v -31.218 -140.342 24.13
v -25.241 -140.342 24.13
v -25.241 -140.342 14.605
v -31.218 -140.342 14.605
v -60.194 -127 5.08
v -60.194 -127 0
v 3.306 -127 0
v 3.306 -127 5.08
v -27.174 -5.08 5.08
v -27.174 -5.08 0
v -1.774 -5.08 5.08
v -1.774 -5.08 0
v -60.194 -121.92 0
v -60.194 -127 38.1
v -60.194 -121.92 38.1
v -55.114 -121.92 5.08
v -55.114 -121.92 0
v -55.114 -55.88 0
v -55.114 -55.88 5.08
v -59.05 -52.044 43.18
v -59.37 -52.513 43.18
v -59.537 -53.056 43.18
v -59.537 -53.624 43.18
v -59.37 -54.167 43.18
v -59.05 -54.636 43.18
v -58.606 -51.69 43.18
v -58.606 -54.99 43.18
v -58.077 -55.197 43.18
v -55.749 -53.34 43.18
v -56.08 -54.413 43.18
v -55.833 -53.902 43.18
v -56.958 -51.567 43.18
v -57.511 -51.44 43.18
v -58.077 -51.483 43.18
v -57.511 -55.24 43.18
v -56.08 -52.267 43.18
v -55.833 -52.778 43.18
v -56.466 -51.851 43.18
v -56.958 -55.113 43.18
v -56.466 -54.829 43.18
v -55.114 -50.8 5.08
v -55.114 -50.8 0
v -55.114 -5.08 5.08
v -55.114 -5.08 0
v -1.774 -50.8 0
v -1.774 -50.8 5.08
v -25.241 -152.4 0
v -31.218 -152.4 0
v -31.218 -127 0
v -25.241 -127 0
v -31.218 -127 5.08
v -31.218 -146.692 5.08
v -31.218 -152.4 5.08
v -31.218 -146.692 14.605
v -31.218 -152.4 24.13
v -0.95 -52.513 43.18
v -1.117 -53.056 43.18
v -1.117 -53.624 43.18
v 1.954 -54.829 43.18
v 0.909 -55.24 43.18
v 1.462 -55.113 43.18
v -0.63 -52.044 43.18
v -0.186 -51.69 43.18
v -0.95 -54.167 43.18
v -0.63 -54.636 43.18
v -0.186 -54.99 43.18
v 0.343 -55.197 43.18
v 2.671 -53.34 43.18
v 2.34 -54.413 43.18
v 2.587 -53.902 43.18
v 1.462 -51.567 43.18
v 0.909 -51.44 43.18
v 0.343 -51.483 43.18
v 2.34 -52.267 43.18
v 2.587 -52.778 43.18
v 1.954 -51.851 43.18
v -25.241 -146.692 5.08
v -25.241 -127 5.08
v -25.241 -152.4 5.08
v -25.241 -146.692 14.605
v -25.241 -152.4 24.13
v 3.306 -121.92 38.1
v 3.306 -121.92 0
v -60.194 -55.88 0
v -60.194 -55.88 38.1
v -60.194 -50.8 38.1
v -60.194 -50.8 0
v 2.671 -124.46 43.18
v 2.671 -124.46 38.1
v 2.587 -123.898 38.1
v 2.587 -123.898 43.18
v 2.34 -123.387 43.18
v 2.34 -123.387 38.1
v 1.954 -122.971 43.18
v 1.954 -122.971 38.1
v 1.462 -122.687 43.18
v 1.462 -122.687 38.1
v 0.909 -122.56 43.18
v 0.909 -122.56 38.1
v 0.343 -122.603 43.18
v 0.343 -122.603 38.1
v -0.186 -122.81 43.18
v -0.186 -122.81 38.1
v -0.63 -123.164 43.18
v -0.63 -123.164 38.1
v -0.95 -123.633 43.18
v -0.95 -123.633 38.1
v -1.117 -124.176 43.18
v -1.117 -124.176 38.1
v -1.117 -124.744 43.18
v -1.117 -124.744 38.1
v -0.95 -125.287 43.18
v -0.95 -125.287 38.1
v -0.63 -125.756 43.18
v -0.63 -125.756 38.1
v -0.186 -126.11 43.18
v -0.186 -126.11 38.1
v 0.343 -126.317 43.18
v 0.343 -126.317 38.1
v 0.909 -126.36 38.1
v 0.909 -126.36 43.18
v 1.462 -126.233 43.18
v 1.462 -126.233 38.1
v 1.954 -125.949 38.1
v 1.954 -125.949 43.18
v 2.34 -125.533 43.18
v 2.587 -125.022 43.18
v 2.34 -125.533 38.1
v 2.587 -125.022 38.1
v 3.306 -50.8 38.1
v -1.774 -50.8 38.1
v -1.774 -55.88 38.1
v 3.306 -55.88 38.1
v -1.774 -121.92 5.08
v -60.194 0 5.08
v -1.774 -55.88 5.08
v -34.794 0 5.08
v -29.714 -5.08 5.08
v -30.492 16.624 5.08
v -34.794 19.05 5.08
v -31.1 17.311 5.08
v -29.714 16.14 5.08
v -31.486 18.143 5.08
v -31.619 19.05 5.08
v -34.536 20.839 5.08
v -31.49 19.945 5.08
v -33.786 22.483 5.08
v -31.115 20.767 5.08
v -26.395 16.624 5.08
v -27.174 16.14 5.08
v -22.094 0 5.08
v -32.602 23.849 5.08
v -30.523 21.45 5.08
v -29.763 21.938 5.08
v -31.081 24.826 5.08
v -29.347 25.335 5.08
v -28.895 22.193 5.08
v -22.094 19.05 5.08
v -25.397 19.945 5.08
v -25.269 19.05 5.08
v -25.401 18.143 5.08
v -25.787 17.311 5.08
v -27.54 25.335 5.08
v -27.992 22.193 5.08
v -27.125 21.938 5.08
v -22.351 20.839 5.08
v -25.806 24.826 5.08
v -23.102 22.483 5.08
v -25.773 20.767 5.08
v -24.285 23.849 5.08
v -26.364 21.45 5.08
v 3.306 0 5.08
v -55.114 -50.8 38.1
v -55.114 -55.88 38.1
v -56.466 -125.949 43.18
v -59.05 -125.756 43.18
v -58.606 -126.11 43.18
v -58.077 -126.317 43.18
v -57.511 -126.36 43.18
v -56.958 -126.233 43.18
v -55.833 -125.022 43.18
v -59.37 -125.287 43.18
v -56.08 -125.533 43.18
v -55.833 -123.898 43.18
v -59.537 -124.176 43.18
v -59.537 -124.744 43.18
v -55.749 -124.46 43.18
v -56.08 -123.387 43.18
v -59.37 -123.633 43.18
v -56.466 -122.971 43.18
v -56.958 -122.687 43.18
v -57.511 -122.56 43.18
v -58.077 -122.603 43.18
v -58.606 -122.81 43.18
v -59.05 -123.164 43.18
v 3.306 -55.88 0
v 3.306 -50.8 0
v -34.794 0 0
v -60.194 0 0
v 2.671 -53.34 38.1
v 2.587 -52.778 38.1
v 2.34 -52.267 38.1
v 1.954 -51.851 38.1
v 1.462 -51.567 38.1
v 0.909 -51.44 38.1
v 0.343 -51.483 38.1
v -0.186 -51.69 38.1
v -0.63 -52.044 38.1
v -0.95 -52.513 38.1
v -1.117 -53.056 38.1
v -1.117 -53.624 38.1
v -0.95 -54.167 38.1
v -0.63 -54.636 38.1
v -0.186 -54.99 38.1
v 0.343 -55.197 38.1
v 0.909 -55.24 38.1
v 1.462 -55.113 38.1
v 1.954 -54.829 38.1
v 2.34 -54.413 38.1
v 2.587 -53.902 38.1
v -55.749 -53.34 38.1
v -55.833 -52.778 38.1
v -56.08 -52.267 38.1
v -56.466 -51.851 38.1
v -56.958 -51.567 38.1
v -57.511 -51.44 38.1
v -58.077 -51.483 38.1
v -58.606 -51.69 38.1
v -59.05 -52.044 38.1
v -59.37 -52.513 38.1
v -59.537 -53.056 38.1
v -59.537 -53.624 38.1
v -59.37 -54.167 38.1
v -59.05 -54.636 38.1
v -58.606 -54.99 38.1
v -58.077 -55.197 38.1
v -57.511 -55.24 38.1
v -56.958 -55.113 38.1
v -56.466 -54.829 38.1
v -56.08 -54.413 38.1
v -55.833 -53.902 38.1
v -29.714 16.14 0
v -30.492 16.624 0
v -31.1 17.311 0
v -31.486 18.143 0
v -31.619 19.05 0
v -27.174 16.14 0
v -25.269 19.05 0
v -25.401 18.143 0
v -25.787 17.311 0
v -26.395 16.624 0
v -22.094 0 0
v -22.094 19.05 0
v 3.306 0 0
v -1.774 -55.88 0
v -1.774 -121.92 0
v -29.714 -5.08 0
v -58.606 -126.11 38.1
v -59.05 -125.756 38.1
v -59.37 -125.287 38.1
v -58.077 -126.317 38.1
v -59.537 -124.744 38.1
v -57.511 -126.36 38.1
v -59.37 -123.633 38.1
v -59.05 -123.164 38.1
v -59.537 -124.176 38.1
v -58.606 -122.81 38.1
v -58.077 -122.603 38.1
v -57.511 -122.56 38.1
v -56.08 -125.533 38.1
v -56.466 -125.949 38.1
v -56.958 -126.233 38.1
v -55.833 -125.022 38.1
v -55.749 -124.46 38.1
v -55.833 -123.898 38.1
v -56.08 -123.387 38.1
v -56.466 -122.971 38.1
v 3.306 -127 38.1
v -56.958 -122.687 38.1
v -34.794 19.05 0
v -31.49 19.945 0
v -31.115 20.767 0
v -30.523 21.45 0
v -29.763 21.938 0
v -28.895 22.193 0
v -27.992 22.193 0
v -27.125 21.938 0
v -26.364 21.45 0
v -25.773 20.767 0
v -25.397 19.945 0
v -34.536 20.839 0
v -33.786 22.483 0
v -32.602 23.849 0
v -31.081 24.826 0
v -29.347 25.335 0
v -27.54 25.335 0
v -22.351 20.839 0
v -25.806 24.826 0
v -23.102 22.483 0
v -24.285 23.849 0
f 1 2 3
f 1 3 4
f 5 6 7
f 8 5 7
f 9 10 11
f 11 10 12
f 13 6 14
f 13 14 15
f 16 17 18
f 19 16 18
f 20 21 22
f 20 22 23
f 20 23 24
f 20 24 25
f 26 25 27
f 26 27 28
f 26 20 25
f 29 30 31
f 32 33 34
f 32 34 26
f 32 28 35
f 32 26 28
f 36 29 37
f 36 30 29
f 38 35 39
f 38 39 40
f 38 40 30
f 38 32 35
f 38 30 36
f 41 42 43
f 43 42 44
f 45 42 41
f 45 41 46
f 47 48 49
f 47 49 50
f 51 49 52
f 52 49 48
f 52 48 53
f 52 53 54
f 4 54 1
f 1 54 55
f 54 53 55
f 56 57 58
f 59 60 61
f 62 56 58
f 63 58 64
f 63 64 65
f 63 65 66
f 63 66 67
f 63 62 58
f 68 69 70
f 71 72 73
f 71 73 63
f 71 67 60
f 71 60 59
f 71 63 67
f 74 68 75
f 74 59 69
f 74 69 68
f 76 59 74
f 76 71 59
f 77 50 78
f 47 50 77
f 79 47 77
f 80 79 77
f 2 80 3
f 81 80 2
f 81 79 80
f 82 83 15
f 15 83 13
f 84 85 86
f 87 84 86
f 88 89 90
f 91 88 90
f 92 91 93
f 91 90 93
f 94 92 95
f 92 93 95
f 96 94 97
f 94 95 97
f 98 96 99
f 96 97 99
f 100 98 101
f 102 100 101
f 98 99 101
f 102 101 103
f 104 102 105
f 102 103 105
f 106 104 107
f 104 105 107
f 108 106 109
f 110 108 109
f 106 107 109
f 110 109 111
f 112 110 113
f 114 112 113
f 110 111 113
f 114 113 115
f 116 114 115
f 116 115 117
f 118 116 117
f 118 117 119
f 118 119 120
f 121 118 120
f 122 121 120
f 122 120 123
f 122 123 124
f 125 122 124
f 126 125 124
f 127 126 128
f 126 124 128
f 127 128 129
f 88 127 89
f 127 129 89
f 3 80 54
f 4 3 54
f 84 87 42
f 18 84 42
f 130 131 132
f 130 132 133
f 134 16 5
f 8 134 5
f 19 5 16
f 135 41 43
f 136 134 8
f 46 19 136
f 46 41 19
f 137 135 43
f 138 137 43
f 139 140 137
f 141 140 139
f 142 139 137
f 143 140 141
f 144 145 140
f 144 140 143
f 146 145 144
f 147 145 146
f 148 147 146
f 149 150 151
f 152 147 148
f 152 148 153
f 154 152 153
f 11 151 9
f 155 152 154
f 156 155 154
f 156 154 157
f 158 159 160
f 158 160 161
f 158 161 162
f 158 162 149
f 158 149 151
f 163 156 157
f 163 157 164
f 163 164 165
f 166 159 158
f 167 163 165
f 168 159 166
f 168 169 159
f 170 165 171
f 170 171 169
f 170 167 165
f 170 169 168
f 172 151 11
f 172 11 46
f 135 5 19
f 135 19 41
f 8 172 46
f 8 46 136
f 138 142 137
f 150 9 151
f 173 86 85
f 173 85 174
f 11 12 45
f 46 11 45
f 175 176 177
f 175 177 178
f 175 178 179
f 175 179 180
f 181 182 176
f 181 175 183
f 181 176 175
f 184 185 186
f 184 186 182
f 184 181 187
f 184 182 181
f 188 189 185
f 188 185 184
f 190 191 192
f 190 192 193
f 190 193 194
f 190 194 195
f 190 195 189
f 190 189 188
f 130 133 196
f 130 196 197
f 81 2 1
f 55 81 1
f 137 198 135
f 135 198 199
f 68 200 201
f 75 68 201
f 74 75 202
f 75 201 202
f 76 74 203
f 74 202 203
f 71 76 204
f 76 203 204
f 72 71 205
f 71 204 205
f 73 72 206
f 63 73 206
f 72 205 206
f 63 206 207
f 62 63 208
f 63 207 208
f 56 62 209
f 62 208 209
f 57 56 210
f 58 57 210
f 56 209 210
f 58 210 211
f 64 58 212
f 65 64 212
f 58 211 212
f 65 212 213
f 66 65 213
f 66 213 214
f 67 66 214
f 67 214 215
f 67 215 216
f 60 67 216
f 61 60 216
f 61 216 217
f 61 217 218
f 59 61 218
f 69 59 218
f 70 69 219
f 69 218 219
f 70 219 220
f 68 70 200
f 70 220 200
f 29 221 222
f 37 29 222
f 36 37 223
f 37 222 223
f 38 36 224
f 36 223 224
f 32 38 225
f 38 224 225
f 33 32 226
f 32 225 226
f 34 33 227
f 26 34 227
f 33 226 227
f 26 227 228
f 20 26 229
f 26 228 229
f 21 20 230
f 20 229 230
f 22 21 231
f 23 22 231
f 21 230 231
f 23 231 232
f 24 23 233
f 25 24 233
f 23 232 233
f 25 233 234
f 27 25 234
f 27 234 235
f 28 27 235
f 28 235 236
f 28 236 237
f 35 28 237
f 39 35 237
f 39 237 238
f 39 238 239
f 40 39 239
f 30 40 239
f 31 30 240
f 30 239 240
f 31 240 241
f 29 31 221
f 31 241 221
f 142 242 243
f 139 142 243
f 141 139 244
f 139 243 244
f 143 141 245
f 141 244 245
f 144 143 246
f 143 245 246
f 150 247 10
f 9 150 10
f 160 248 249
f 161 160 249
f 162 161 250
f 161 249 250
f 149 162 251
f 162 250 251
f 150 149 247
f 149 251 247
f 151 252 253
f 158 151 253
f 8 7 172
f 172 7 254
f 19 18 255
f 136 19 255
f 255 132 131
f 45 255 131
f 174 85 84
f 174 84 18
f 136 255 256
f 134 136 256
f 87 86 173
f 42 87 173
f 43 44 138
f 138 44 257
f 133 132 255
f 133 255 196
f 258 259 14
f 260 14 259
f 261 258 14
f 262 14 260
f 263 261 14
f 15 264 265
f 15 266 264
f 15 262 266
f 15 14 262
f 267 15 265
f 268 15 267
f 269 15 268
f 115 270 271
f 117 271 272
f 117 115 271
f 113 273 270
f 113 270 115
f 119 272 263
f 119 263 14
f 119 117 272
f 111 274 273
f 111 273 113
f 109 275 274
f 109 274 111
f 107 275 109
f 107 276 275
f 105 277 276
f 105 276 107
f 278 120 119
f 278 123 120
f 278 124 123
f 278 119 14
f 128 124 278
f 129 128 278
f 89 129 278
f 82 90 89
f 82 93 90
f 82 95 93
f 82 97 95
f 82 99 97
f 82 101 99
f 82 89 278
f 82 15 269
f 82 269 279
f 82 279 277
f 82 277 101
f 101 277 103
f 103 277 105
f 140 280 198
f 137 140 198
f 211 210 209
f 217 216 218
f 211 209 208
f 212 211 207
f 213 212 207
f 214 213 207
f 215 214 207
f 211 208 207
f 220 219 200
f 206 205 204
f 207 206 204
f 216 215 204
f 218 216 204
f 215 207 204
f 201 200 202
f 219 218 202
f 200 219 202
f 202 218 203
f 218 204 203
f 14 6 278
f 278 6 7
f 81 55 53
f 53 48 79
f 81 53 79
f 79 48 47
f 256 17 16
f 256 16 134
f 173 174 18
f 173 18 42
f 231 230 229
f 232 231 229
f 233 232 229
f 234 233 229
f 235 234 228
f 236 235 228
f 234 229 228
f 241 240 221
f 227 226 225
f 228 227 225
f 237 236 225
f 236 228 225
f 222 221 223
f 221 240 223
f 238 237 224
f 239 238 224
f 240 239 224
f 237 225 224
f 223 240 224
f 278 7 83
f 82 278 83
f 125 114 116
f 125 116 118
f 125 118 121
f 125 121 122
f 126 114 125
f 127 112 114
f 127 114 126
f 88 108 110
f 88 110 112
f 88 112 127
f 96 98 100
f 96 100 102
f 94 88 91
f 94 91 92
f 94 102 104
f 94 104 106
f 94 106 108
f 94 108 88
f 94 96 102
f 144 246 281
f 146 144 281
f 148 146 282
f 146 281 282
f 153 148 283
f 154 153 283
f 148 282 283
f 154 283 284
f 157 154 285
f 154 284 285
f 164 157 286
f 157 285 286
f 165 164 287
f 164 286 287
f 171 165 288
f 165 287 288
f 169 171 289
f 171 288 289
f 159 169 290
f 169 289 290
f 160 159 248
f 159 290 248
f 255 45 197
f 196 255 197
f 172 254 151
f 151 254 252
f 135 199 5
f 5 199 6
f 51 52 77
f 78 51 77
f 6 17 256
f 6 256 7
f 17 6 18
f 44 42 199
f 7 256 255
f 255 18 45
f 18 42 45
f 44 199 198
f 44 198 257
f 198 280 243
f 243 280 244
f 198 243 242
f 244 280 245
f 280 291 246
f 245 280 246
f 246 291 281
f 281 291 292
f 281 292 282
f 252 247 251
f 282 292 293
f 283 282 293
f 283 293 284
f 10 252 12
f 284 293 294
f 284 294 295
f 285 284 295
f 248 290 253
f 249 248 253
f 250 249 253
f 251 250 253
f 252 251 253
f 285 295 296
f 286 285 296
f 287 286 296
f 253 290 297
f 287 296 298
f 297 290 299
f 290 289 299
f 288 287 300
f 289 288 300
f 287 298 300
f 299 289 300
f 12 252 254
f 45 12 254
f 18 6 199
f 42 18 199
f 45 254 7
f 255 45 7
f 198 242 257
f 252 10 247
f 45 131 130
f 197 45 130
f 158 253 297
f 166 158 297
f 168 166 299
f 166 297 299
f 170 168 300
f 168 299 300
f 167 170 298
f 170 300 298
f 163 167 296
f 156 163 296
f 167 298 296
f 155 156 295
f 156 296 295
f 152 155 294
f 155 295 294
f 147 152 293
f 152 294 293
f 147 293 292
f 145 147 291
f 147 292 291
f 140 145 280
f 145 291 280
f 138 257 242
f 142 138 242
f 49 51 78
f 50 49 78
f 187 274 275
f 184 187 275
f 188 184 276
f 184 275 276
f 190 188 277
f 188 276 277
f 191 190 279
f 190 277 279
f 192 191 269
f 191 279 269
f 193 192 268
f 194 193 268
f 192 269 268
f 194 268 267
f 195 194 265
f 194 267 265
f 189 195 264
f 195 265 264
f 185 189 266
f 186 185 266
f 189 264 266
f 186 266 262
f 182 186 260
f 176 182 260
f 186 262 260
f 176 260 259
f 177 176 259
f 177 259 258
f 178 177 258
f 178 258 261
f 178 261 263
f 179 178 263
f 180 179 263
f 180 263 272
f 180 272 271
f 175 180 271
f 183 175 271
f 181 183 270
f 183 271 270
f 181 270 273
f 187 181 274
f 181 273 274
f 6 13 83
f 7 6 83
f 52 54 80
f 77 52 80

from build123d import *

# Parameters (mm, degrees)
F0_W      = 5.08
F0_H      = 5.08
F1_DEPTH  = 38.1
F0_W_2    = 53.34
F0_H_2    = 45.72
F0_H_3    = 66.04
F2_DEPTH  = 5.08
F5_R      = 1.905
F6_DEPTH  = 5.08
F4_R      = 1.905
F3_R      = 1.905
F7_W      = 5.9777759016
F7_H      = 5.08
F8_DEPTH  = 25.4
F9_W      = 5.9777759016
F9_H      = 5.7076345921
F10_DEPTH = 19.05
F11_W     = 5.9777759016
F11_H     = 9.525
F12_DEPTH = 6.35


with BuildPart() as f1:
    # F0 (on Top) → F1 (new body)
    with BuildSketch(Plane.XY):
        with Locations((-57.6535785222, -53.34)):
            Rectangle(F0_W, F0_H)
    extrude(amount=F1_DEPTH)


with BuildPart() as f1b:
    # F0 (on Top) → F1, piece 2 (new body)
    with BuildSketch(Plane.XY):
        with Locations((0.7664214778, -53.34)):
            Rectangle(F0_W, F0_H)
    extrude(amount=F1_DEPTH)


with BuildPart() as f1c:
    # F0 (on Top) → F1, piece 3 (new body)
    with BuildSketch(Plane.XY):
        with Locations((0.7664214778, -124.46)):
            Rectangle(F0_W, F0_H)
        with Locations((-57.6535785222, -124.46)):
            Rectangle(F0_W, F0_H)
        with Locations((-28.4435785222, -124.46)):
            Rectangle(F0_W_2, F0_H)
    extrude(amount=F1_DEPTH)

    # F5 (on face) → F6 (join)
    with BuildSketch(Plane.XY.offset(38.1)):
        with Locations((-57.6535785222, -124.46)):
            Circle(F5_R)
        with Locations((0.7664214778, -124.46)):
            Circle(F5_R)
    extrude(amount=F6_DEPTH)


with BuildPart() as f2:
    # F0 (on Top) → F2 (new body)
    with BuildSketch(Plane.XY):
        with BuildLine():
            Line((-22.0935785222, 19.05), (-25.2685785222, 19.05))
            ThreePointArc((-25.2685785222, 19.05), (-25.787182938, 17.3109808799), (-27.1735785222, 16.1400644337))
            Line((-27.1735785222, 16.1400644337), (-27.1735785222, 12.8282960533))
            ThreePointArc((-27.1735785222, 12.8282960533), (-23.5248896725, 15.0339073716), (-22.0935785222, 19.05))
        make_face()
        with BuildLine():
            ThreePointArc((-31.6185785222, 19.05), (-28.4435785222, 22.225), (-25.2685785222, 19.05))
            Line((-25.2685785222, 19.05), (-22.0935785222, 19.05))
            ThreePointArc((-22.0935785222, 19.05), (-28.4435785222, 25.4), (-34.7935785222, 19.05))
            Line((-34.7935785222, 19.05), (-31.6185785222, 19.05))
        make_face()
        with BuildLine():
            ThreePointArc((-29.7135785222, 16.1400644337), (-31.0999741065, 17.3109808799), (-31.6185785222, 19.05))
            Line((-31.6185785222, 19.05), (-34.7935785222, 19.05))
            ThreePointArc((-34.7935785222, 19.05), (-33.3622673719, 15.0339073716), (-29.7135785222, 12.8282960533))
            Line((-29.7135785222, 12.8282960533), (-29.7135785222, 16.1400644337))
        make_face()
        with BuildLine():
            Line((-22.0935785222, 0), (-22.0935785222, 19.05))
            ThreePointArc((-22.0935785222, 19.05), (-23.5248896725, 15.0339073716), (-27.1735785222, 12.8282960533))
            Line((-27.1735785222, 12.8282960533), (-27.1735785222, 0))
            Line((-27.1735785222, 0), (-22.0935785222, 0))
        make_face()
        with BuildLine():
            ThreePointArc((-29.7135785222, 12.8282960533), (-33.3622673719, 15.0339073716), (-34.7935785222, 19.05))
            Line((-34.7935785222, 19.05), (-34.7935785222, 0))
            Line((-34.7935785222, 0), (-29.7135785222, 0))
            Line((-29.7135785222, 0), (-29.7135785222, 12.8282960533))
        make_face()
        Polygon((-1.7735785222, 0), (-22.0935785222, 0), (-27.1735785222, 0), (-27.1735785222, -5.08), (-1.7735785222, -5.08), align=None)
        Polygon((-29.7135785222, 0), (-34.7935785222, 0), (-55.1135785222, 0), (-55.1135785222, -5.08), (-29.7135785222, -5.08), align=None)
        with Locations((0.7664214778, -2.54)):
            Rectangle(F0_W, F0_H)
        with Locations((-57.6535785222, -2.54)):
            Rectangle(F0_W, F0_H)
        with Locations((0.7664214778, -27.94)):
            Rectangle(F0_W, F0_H_2)
        with Locations((-57.6535785222, -27.94)):
            Rectangle(F0_W, F0_H_2)
        with Locations((0.7664214778, -53.34)):
            Rectangle(F0_W, F0_H)
        with Locations((-57.6535785222, -53.34)):
            Rectangle(F0_W, F0_H)
        with Locations((0.7664214778, -88.9)):
            Rectangle(F0_W, F0_H_3)
        with Locations((-57.6535785222, -88.9)):
            Rectangle(F0_W, F0_H_3)
        with Locations((0.7664214778, -124.46)):
            Rectangle(F0_W, F0_H)
        with Locations((-28.4435785222, -124.46)):
            Rectangle(F0_W_2, F0_H)
        with Locations((-57.6535785222, -124.46)):
            Rectangle(F0_W, F0_H)
        with Locations((-28.4435785222, -53.34)):
            Rectangle(F0_W_2, F0_H)
    extrude(amount=F2_DEPTH)


with BuildPart() as f6:
    # F4 (on face) → F6, piece 2 (new body)
    with BuildSketch(Plane.XY.offset(38.1)):
        with Locations((0.7664214778, -53.34)):
            Circle(F4_R)
    extrude(amount=F6_DEPTH)


with BuildPart() as f6b:
    # F3 (on face) → F6, piece 3 (new body)
    with BuildSketch(Plane.XY.offset(38.1)):
        with Locations((-57.6535785222, -53.34)):
            Circle(F3_R)
    extrude(amount=F6_DEPTH)


with BuildPart() as f8:
    # F7 (on face) → F8 (new body)
    with BuildSketch(Plane.XZ.offset(127)):
        with Locations((-28.2295271754, 2.54)):
            Rectangle(F7_W, F7_H)
    extrude(amount=F8_DEPTH)

    # F9 (on face) → F10 (join)
    with BuildSketch(Plane.XY.offset(5.08)):
        with Locations((-28.2295271754, -149.546182704)):
            Rectangle(F9_W, F9_H)
    extrude(amount=F10_DEPTH)

    # F11 (on face) → F12 (join)
    with BuildSketch(Plane(origin=(0, -146.6923654079, 0), x_dir=(-1, 0, 0), z_dir=(0, 1, 0))):
        with Locations((28.2295271754, 19.3675)):
            Rectangle(F11_W, F11_H)
    extrude(amount=F12_DEPTH)


solid = Compound([f1.part, f1b.part, f1c.part, f2.part, f6.part, f6b.part, f8.part])
